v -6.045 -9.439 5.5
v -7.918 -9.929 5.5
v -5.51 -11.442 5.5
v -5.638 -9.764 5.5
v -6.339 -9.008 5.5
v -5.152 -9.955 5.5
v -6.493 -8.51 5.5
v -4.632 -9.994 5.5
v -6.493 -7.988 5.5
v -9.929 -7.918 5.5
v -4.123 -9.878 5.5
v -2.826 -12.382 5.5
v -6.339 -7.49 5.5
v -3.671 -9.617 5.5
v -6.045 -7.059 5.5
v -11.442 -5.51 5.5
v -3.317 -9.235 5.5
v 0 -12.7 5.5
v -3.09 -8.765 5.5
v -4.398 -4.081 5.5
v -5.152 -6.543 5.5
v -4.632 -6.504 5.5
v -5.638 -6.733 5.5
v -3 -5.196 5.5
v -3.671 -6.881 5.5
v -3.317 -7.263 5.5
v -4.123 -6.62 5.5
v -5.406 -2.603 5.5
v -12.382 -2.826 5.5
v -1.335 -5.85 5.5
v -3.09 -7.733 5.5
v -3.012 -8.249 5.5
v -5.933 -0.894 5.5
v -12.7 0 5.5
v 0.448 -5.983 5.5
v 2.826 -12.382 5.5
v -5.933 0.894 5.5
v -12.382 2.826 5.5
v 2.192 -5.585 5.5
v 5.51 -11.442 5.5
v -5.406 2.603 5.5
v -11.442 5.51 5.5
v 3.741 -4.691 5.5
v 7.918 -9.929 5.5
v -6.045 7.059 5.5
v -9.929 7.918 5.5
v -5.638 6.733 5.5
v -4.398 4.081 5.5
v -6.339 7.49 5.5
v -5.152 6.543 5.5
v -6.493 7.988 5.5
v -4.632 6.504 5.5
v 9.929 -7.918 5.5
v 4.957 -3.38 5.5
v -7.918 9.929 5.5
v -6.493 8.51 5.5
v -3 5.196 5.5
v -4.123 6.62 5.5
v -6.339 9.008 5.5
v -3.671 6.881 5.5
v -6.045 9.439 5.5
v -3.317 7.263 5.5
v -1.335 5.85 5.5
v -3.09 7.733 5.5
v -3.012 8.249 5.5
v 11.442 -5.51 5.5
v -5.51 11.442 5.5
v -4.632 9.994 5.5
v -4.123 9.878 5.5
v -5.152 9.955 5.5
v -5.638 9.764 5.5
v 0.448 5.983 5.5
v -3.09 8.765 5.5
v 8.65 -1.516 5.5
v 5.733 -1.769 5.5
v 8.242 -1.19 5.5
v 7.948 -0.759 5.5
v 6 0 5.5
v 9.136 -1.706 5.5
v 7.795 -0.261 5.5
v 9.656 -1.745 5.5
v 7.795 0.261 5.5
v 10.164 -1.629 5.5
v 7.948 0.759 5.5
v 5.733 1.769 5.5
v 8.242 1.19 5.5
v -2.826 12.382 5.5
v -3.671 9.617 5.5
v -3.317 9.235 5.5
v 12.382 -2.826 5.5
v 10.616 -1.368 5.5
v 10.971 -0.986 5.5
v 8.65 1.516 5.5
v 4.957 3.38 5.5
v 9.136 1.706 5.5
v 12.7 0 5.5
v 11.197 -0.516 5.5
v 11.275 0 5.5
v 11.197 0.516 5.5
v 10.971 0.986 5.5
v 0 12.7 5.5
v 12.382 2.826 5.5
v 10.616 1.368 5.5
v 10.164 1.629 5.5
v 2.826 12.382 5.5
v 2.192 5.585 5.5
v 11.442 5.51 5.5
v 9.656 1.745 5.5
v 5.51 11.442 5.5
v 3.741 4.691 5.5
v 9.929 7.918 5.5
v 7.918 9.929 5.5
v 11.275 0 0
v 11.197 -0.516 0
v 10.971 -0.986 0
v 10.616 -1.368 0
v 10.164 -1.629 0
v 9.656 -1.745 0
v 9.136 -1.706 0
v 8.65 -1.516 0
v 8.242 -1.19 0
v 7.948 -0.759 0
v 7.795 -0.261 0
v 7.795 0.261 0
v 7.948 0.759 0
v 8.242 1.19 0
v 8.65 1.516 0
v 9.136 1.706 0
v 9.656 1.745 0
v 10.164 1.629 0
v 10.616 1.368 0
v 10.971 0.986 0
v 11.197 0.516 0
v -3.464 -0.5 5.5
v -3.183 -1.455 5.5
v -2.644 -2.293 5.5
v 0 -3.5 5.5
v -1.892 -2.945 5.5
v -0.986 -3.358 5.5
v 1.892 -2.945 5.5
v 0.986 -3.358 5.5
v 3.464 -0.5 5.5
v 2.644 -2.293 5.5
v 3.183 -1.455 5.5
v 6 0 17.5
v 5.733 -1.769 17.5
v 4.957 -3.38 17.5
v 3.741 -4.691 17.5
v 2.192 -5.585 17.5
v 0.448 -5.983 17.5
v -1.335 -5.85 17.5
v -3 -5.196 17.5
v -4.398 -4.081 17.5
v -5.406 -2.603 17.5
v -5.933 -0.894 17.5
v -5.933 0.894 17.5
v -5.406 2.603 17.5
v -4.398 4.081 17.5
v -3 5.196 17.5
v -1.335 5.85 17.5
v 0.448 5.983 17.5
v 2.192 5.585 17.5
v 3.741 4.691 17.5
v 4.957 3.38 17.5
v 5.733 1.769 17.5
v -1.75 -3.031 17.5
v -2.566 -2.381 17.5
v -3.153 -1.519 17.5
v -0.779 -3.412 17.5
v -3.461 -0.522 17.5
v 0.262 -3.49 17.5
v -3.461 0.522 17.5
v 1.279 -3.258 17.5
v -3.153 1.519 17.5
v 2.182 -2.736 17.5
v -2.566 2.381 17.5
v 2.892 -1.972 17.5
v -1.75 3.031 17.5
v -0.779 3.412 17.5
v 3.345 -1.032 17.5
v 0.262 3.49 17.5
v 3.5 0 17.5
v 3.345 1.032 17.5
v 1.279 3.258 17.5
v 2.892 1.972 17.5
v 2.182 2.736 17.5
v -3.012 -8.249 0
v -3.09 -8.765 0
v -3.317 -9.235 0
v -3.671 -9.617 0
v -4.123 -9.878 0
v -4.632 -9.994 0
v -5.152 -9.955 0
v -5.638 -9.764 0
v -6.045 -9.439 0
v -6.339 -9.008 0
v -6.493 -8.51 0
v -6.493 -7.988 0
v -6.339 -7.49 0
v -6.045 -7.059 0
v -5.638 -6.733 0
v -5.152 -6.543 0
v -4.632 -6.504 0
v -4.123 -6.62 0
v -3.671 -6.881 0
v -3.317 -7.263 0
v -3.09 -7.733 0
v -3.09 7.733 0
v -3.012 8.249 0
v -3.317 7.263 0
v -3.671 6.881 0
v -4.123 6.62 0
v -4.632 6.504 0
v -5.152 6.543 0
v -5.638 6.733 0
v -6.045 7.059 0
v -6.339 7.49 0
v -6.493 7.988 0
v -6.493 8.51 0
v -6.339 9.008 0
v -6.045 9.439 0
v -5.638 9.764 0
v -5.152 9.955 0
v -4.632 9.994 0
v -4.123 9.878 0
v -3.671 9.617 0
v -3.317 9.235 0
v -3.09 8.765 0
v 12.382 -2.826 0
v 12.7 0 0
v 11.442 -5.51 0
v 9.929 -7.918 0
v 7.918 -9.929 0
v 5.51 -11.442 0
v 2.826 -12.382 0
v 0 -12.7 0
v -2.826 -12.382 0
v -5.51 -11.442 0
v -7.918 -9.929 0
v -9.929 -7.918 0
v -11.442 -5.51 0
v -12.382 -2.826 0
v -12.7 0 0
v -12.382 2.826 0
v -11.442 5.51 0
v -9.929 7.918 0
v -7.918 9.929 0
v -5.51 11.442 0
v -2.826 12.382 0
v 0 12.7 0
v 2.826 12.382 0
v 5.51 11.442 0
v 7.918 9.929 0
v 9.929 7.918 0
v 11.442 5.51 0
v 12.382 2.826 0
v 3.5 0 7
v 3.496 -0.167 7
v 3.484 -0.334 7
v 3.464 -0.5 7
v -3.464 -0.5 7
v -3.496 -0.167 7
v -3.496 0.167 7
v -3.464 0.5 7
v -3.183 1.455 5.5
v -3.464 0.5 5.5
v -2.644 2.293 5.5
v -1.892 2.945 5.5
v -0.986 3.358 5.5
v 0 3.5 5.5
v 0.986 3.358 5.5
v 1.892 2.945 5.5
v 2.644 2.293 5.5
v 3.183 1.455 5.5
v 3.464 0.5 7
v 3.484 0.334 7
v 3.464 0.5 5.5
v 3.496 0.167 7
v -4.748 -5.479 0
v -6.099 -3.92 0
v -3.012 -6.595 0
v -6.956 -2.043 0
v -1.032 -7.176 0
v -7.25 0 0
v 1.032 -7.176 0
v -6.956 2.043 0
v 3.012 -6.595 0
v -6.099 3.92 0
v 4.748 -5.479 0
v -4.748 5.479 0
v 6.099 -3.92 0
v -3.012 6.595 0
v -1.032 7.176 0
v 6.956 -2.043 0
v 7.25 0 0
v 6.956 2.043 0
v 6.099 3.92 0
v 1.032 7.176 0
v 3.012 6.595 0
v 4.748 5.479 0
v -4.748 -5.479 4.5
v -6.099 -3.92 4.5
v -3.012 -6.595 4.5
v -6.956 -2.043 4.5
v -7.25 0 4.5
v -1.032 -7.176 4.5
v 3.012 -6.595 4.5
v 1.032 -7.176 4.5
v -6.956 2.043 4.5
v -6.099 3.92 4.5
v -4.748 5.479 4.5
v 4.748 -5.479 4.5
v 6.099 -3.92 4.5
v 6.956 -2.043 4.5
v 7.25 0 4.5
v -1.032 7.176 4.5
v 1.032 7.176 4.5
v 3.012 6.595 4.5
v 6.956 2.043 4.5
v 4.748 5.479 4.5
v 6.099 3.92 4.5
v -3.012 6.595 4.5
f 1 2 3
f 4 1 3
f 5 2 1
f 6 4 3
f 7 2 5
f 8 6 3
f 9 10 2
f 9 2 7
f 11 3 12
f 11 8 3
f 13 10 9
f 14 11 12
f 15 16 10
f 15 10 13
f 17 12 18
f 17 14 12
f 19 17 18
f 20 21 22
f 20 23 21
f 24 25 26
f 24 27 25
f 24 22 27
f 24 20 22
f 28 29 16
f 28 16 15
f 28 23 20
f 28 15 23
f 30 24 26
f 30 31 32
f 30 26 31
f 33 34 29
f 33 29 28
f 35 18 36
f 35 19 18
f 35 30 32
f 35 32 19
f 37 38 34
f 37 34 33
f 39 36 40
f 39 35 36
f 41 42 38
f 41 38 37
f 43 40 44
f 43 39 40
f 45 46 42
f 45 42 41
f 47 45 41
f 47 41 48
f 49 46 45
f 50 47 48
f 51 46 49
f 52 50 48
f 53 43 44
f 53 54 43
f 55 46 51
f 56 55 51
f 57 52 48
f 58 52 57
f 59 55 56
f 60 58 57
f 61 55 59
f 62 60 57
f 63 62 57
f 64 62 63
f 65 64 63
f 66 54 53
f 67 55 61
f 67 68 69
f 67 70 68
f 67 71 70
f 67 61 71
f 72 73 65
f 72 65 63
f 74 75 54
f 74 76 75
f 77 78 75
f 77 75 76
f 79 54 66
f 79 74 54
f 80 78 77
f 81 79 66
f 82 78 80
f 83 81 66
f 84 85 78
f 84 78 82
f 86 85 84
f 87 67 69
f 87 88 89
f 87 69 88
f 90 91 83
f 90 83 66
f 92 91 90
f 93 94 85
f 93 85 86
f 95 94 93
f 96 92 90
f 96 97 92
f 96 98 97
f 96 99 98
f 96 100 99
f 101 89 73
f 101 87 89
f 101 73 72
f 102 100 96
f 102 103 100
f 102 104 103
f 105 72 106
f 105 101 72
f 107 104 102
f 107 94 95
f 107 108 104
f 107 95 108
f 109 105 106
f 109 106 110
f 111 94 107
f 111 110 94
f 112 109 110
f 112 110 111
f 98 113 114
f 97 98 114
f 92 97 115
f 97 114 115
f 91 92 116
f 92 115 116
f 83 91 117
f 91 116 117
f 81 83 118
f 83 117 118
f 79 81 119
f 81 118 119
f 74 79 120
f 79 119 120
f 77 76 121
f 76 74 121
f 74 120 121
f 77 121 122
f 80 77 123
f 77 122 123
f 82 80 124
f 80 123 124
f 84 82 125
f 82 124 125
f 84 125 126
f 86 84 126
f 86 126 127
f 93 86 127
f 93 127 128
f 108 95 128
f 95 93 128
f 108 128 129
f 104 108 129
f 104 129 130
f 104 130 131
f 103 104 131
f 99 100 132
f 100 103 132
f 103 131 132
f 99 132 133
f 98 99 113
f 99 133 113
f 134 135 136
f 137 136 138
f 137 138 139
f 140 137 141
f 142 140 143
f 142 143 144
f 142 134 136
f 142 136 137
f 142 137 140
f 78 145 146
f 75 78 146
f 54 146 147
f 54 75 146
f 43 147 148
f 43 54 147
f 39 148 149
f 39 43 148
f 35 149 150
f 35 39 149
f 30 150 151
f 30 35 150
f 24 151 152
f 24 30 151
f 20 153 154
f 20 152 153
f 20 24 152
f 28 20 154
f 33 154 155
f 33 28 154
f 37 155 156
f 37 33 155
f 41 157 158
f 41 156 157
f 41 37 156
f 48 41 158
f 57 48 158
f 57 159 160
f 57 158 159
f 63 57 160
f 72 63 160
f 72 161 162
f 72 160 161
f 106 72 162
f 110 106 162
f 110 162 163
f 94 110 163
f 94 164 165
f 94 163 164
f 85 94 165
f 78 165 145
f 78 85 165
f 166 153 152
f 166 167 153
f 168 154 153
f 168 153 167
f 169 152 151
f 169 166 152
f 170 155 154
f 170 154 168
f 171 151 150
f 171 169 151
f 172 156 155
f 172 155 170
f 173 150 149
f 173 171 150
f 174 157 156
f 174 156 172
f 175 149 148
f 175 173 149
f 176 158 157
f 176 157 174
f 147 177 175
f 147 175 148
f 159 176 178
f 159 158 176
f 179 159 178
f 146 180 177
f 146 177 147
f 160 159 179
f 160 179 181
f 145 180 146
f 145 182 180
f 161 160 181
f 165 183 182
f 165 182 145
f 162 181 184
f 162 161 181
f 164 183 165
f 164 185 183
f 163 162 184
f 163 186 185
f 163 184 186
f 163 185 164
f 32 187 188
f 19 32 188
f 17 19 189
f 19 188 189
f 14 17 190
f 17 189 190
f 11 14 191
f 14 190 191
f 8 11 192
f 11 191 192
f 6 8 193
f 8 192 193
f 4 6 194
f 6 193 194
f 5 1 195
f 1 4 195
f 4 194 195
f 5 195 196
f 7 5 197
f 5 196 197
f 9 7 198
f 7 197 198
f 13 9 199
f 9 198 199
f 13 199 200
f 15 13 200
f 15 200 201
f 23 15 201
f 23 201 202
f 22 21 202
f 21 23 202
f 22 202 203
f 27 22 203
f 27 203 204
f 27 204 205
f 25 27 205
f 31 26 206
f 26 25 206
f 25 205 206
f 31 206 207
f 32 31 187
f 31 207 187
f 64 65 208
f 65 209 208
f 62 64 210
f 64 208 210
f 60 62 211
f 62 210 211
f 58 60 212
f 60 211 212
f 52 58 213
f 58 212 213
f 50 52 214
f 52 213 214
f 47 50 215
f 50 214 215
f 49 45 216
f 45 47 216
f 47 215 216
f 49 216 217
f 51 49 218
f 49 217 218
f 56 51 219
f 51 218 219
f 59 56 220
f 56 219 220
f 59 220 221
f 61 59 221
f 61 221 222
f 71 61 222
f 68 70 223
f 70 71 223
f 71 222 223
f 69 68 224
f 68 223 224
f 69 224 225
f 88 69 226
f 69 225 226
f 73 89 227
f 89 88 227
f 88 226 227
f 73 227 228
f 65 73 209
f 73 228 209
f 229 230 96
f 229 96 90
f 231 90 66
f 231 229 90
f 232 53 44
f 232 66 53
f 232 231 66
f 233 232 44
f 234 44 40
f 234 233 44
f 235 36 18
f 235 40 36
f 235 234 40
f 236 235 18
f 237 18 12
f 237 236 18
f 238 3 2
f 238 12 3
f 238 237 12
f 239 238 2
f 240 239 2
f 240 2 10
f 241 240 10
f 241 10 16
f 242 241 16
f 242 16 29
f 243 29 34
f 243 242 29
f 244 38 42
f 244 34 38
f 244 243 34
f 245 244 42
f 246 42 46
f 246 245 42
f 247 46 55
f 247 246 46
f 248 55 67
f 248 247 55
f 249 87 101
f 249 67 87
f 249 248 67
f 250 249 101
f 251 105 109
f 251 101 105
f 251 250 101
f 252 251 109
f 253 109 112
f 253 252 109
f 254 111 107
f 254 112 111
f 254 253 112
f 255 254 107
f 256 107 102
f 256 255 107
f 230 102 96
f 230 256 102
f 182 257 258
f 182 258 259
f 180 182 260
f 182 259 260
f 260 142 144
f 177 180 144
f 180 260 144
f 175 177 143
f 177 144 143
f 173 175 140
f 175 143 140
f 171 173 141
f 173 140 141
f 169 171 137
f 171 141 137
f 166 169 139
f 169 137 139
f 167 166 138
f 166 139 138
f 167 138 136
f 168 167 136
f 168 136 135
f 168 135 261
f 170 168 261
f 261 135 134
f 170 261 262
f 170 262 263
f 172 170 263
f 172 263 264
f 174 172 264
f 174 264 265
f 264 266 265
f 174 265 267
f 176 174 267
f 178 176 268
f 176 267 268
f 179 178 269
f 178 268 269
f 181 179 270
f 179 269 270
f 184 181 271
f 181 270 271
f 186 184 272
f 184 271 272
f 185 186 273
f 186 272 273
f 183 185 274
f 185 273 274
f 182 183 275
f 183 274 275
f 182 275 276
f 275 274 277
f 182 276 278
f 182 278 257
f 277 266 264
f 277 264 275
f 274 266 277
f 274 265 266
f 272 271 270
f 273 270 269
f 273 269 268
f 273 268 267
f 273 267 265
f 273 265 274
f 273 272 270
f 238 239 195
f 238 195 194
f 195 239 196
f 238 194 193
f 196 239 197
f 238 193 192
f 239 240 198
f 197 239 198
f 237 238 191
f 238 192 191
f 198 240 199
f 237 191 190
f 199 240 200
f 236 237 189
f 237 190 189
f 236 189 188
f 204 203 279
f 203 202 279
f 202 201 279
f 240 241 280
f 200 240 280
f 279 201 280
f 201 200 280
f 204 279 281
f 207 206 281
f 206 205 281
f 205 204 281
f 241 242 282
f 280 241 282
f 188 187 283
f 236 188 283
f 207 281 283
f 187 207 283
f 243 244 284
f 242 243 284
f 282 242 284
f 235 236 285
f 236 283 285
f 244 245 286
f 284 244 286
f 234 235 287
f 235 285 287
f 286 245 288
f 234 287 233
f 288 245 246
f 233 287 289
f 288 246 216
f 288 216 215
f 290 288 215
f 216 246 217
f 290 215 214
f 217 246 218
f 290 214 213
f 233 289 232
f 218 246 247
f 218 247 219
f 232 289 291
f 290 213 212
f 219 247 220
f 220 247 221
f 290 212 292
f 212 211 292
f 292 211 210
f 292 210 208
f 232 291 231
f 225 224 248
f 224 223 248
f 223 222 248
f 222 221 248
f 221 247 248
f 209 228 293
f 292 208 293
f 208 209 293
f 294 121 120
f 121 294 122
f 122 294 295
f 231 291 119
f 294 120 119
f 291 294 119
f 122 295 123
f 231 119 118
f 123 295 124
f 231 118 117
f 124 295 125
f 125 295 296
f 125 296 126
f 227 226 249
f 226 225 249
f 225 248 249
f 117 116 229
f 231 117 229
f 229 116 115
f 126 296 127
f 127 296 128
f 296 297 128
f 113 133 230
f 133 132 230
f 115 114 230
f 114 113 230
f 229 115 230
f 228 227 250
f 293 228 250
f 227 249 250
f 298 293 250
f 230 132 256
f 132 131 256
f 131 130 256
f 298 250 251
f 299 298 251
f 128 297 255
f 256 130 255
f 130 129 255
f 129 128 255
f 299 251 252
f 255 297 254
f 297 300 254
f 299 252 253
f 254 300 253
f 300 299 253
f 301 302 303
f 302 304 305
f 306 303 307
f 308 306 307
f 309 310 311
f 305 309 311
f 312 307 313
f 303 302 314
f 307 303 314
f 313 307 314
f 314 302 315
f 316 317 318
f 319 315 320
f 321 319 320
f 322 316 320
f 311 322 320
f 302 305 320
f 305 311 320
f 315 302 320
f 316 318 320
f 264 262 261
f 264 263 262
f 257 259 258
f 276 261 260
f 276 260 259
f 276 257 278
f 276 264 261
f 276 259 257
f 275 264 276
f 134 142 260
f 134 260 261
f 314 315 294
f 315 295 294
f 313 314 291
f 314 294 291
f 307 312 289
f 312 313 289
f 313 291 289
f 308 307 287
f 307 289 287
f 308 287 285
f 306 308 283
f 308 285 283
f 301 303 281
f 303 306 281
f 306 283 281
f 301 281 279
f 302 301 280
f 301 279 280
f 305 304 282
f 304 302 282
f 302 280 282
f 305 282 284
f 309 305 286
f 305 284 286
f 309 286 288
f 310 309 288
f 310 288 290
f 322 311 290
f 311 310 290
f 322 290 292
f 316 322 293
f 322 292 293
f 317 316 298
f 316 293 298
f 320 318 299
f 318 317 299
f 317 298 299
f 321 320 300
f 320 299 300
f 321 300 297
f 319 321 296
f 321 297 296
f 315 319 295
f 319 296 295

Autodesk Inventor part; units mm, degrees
ref_plane "YZ Plane" through (0, 0, 0) normal (1, 0, 0) x (0, 1, 0)
ref_plane "XZ Plane" through (0, 0, 0) normal (0, 1, 0) x (-1, 0, 0)
ref_plane "XY Plane" through (0, 0, 0) normal (0, 0, 1) x (1, 0, 0)
sketch "Sketch1" plane through (0, 0, 0) normal (0, 0, 1) x (1, 0, 0)
  circle A0 centre (0, 0) radius 7.25
  circle A1 centre (0, 0) radius 12.7
  circle A2 centre (0, 0) radius 9.525 construction
  circle A3 centre (9.525, 0) radius 1.75
  circle A4 centre (-4.7625, 8.2489) radius 1.75
  circle A5 centre (-4.7625, -8.2489) radius 1.75
  dimension "d2" = 19.05
  dimension "d0" = 14.5
  dimension "d1" = 25.4
  dimension "d3" = 3.5
  dimension "d6" = 360
extrude "Extrusion1" add sketch "Sketch1" along normal blind 4.5
sketch "Sketch2" plane through (0, 0, 4.5) normal (0, 0, 1) x (1, 0, 0)
  circle A0 centre (0, 0) radius 12.7 projected
  circle A1 centre (-4.7625, 8.2489) radius 1.75 projected
  circle A2 centre (9.525, 0) radius 1.75 projected
  circle A3 centre (-4.7625, -8.2489) radius 1.75 projected
extrude "Extrusion2" add sketch "Sketch2" along normal blind 1
sketch "Sketch3" plane through (0, 0, 5.5) normal (0, 0, 1) x (1, 0, 0)
  line L0 (-4, 0.5) -> (4, 0.5)
  line L1 (4, 0.5) -> (4, -0.5)
  line L2 (4, -0.5) -> (-4, -0.5)
  line L3 (-4, -0.5) -> (-4, 0.5)
  point P0 (0, 0)
  point P1 (4, 0)
  point P2 (0, 0.5)
  dimension "d12" = 1
  dimension "d13" = 8
extrude "Extrusion3" add sketch "Sketch3" along normal blind 1.5
sketch "Sketch4" plane through (0, 0, 5.5) normal (0, 0, 1) x (1, 0, 0)
  circle A0 centre (0, 0) radius 3.5
  circle A1 centre (0, 0) radius 6
  dimension "d16" = 7
  dimension "d17" = 12
extrude "Extrusion4" add sketch "Sketch4" along normal blind 12
properties part number "AA038" material "ABS Plastic"
